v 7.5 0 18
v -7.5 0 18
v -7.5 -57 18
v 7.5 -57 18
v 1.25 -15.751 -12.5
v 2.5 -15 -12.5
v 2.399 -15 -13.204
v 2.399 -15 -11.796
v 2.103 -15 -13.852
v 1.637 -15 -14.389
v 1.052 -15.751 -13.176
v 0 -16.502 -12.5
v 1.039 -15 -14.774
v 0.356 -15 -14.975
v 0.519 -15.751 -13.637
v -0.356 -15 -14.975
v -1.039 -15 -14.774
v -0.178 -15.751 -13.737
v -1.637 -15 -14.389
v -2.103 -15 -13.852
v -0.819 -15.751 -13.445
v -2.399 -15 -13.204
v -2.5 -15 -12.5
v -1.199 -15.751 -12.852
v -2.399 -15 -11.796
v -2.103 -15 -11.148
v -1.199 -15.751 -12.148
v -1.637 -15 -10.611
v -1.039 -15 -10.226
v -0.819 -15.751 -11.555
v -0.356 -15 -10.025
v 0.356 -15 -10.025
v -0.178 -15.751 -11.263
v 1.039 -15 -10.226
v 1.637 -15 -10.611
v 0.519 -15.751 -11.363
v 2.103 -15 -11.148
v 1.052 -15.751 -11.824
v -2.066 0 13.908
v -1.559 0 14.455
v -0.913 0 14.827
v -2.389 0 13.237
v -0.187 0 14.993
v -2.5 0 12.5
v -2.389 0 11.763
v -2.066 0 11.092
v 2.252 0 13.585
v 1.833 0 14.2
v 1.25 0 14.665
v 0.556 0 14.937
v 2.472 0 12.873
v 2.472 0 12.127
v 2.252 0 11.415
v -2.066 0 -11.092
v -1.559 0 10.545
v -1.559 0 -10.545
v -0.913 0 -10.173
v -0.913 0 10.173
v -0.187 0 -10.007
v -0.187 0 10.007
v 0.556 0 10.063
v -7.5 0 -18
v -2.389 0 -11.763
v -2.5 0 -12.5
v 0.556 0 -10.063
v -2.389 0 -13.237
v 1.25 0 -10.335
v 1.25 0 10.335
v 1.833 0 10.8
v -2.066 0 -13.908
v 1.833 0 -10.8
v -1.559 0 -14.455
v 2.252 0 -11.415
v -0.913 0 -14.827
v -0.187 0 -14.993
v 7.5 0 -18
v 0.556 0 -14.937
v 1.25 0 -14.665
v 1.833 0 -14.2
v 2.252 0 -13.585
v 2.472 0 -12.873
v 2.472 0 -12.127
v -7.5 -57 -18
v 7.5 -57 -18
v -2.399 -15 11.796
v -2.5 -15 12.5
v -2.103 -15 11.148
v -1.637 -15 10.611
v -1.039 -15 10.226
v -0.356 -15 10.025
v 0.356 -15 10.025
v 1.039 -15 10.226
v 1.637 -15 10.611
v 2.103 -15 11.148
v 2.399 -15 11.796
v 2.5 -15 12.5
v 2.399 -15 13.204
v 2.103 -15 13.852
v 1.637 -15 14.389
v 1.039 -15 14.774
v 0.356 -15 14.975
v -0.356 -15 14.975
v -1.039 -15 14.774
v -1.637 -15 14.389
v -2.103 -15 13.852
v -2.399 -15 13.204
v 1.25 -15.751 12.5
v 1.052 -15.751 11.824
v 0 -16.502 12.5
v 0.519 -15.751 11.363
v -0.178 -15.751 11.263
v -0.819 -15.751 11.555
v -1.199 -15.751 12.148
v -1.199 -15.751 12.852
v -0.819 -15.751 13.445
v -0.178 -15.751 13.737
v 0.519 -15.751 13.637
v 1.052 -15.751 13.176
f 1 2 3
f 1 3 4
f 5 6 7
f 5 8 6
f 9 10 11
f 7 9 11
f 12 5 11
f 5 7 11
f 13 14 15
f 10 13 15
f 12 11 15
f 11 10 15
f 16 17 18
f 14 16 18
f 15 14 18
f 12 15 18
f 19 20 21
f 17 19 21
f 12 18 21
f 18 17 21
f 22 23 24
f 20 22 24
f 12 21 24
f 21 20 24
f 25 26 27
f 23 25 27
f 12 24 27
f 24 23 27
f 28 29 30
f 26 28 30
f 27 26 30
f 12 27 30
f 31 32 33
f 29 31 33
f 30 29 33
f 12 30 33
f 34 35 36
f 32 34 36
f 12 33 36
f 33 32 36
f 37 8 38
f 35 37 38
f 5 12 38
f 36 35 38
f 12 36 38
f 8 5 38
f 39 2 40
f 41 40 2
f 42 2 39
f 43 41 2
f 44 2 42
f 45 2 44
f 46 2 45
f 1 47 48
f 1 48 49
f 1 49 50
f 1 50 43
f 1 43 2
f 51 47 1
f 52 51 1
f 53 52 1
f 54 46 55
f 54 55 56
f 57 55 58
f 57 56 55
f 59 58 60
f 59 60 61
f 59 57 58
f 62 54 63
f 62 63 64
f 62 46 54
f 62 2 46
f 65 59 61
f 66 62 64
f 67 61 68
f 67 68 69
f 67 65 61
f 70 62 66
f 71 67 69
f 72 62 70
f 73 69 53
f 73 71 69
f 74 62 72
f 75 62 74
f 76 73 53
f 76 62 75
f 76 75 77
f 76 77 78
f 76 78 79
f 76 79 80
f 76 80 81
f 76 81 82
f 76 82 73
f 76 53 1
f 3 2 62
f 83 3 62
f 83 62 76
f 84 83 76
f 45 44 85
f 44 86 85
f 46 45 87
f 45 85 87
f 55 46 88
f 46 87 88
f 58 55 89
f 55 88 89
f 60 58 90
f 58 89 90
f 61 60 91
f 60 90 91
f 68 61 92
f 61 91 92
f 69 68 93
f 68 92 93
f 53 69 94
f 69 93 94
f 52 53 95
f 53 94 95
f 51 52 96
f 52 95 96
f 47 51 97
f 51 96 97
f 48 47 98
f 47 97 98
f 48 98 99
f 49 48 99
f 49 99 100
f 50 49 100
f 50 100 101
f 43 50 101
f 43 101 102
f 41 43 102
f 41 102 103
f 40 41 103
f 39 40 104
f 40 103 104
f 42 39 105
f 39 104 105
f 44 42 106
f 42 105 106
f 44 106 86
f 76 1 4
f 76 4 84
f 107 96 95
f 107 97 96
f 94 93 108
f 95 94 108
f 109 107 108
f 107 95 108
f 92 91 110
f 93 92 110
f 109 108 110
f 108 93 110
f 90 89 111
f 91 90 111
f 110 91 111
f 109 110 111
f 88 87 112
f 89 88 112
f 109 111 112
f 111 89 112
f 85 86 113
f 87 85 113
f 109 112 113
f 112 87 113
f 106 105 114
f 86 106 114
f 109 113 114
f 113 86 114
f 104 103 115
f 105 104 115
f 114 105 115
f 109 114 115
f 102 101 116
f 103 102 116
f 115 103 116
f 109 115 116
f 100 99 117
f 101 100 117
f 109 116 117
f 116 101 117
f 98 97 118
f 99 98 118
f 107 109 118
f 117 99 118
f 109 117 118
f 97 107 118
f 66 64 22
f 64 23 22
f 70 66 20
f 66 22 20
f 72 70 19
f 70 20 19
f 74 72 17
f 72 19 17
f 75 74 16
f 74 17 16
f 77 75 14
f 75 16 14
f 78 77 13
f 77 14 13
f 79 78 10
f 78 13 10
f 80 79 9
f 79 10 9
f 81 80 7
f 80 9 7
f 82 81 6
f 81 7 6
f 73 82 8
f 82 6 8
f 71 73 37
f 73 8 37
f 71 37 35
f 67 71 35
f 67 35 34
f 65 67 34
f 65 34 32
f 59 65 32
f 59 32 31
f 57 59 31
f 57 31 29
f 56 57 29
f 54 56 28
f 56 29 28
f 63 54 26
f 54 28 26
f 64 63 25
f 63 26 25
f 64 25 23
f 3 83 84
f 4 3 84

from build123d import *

# Parameters (mm, degrees)
SKETCH1_W             = 15
SKETCH1_H             = 36
BOSS_EXTRUDE1_DEPTH   = 57
M6_TAPPED_HOLE1_D     = 5
M6_TAPPED_HOLE1_DEPTH = 15
M6_TAPPED_HOLE1_TIP   = 1.502151548


with BuildPart() as part:
    # Sketch1 → Boss-Extrude1 (new body)
    with BuildSketch(Plane(origin=(0, 0, 0), x_dir=(1, 0, 0), z_dir=(0, 1, 0))):
        Rectangle(SKETCH1_W, SKETCH1_H)
    extrude(amount=-BOSS_EXTRUDE1_DEPTH)

    # M6 Tapped Hole1
    with Locations(Plane(origin=(0, 0, 0), x_dir=(1, 0, 0), z_dir=(0, 1, 0))):
        with Locations((0, 12.5), (0, -12.5)):
            Hole(M6_TAPPED_HOLE1_D / 2, depth=M6_TAPPED_HOLE1_DEPTH)
            with Locations((0, 0, -(M6_TAPPED_HOLE1_DEPTH + M6_TAPPED_HOLE1_TIP / 2))):  # 118° drill point
                Cone(0, M6_TAPPED_HOLE1_D / 2, M6_TAPPED_HOLE1_TIP, mode=Mode.SUBTRACT)


solid = part.part
